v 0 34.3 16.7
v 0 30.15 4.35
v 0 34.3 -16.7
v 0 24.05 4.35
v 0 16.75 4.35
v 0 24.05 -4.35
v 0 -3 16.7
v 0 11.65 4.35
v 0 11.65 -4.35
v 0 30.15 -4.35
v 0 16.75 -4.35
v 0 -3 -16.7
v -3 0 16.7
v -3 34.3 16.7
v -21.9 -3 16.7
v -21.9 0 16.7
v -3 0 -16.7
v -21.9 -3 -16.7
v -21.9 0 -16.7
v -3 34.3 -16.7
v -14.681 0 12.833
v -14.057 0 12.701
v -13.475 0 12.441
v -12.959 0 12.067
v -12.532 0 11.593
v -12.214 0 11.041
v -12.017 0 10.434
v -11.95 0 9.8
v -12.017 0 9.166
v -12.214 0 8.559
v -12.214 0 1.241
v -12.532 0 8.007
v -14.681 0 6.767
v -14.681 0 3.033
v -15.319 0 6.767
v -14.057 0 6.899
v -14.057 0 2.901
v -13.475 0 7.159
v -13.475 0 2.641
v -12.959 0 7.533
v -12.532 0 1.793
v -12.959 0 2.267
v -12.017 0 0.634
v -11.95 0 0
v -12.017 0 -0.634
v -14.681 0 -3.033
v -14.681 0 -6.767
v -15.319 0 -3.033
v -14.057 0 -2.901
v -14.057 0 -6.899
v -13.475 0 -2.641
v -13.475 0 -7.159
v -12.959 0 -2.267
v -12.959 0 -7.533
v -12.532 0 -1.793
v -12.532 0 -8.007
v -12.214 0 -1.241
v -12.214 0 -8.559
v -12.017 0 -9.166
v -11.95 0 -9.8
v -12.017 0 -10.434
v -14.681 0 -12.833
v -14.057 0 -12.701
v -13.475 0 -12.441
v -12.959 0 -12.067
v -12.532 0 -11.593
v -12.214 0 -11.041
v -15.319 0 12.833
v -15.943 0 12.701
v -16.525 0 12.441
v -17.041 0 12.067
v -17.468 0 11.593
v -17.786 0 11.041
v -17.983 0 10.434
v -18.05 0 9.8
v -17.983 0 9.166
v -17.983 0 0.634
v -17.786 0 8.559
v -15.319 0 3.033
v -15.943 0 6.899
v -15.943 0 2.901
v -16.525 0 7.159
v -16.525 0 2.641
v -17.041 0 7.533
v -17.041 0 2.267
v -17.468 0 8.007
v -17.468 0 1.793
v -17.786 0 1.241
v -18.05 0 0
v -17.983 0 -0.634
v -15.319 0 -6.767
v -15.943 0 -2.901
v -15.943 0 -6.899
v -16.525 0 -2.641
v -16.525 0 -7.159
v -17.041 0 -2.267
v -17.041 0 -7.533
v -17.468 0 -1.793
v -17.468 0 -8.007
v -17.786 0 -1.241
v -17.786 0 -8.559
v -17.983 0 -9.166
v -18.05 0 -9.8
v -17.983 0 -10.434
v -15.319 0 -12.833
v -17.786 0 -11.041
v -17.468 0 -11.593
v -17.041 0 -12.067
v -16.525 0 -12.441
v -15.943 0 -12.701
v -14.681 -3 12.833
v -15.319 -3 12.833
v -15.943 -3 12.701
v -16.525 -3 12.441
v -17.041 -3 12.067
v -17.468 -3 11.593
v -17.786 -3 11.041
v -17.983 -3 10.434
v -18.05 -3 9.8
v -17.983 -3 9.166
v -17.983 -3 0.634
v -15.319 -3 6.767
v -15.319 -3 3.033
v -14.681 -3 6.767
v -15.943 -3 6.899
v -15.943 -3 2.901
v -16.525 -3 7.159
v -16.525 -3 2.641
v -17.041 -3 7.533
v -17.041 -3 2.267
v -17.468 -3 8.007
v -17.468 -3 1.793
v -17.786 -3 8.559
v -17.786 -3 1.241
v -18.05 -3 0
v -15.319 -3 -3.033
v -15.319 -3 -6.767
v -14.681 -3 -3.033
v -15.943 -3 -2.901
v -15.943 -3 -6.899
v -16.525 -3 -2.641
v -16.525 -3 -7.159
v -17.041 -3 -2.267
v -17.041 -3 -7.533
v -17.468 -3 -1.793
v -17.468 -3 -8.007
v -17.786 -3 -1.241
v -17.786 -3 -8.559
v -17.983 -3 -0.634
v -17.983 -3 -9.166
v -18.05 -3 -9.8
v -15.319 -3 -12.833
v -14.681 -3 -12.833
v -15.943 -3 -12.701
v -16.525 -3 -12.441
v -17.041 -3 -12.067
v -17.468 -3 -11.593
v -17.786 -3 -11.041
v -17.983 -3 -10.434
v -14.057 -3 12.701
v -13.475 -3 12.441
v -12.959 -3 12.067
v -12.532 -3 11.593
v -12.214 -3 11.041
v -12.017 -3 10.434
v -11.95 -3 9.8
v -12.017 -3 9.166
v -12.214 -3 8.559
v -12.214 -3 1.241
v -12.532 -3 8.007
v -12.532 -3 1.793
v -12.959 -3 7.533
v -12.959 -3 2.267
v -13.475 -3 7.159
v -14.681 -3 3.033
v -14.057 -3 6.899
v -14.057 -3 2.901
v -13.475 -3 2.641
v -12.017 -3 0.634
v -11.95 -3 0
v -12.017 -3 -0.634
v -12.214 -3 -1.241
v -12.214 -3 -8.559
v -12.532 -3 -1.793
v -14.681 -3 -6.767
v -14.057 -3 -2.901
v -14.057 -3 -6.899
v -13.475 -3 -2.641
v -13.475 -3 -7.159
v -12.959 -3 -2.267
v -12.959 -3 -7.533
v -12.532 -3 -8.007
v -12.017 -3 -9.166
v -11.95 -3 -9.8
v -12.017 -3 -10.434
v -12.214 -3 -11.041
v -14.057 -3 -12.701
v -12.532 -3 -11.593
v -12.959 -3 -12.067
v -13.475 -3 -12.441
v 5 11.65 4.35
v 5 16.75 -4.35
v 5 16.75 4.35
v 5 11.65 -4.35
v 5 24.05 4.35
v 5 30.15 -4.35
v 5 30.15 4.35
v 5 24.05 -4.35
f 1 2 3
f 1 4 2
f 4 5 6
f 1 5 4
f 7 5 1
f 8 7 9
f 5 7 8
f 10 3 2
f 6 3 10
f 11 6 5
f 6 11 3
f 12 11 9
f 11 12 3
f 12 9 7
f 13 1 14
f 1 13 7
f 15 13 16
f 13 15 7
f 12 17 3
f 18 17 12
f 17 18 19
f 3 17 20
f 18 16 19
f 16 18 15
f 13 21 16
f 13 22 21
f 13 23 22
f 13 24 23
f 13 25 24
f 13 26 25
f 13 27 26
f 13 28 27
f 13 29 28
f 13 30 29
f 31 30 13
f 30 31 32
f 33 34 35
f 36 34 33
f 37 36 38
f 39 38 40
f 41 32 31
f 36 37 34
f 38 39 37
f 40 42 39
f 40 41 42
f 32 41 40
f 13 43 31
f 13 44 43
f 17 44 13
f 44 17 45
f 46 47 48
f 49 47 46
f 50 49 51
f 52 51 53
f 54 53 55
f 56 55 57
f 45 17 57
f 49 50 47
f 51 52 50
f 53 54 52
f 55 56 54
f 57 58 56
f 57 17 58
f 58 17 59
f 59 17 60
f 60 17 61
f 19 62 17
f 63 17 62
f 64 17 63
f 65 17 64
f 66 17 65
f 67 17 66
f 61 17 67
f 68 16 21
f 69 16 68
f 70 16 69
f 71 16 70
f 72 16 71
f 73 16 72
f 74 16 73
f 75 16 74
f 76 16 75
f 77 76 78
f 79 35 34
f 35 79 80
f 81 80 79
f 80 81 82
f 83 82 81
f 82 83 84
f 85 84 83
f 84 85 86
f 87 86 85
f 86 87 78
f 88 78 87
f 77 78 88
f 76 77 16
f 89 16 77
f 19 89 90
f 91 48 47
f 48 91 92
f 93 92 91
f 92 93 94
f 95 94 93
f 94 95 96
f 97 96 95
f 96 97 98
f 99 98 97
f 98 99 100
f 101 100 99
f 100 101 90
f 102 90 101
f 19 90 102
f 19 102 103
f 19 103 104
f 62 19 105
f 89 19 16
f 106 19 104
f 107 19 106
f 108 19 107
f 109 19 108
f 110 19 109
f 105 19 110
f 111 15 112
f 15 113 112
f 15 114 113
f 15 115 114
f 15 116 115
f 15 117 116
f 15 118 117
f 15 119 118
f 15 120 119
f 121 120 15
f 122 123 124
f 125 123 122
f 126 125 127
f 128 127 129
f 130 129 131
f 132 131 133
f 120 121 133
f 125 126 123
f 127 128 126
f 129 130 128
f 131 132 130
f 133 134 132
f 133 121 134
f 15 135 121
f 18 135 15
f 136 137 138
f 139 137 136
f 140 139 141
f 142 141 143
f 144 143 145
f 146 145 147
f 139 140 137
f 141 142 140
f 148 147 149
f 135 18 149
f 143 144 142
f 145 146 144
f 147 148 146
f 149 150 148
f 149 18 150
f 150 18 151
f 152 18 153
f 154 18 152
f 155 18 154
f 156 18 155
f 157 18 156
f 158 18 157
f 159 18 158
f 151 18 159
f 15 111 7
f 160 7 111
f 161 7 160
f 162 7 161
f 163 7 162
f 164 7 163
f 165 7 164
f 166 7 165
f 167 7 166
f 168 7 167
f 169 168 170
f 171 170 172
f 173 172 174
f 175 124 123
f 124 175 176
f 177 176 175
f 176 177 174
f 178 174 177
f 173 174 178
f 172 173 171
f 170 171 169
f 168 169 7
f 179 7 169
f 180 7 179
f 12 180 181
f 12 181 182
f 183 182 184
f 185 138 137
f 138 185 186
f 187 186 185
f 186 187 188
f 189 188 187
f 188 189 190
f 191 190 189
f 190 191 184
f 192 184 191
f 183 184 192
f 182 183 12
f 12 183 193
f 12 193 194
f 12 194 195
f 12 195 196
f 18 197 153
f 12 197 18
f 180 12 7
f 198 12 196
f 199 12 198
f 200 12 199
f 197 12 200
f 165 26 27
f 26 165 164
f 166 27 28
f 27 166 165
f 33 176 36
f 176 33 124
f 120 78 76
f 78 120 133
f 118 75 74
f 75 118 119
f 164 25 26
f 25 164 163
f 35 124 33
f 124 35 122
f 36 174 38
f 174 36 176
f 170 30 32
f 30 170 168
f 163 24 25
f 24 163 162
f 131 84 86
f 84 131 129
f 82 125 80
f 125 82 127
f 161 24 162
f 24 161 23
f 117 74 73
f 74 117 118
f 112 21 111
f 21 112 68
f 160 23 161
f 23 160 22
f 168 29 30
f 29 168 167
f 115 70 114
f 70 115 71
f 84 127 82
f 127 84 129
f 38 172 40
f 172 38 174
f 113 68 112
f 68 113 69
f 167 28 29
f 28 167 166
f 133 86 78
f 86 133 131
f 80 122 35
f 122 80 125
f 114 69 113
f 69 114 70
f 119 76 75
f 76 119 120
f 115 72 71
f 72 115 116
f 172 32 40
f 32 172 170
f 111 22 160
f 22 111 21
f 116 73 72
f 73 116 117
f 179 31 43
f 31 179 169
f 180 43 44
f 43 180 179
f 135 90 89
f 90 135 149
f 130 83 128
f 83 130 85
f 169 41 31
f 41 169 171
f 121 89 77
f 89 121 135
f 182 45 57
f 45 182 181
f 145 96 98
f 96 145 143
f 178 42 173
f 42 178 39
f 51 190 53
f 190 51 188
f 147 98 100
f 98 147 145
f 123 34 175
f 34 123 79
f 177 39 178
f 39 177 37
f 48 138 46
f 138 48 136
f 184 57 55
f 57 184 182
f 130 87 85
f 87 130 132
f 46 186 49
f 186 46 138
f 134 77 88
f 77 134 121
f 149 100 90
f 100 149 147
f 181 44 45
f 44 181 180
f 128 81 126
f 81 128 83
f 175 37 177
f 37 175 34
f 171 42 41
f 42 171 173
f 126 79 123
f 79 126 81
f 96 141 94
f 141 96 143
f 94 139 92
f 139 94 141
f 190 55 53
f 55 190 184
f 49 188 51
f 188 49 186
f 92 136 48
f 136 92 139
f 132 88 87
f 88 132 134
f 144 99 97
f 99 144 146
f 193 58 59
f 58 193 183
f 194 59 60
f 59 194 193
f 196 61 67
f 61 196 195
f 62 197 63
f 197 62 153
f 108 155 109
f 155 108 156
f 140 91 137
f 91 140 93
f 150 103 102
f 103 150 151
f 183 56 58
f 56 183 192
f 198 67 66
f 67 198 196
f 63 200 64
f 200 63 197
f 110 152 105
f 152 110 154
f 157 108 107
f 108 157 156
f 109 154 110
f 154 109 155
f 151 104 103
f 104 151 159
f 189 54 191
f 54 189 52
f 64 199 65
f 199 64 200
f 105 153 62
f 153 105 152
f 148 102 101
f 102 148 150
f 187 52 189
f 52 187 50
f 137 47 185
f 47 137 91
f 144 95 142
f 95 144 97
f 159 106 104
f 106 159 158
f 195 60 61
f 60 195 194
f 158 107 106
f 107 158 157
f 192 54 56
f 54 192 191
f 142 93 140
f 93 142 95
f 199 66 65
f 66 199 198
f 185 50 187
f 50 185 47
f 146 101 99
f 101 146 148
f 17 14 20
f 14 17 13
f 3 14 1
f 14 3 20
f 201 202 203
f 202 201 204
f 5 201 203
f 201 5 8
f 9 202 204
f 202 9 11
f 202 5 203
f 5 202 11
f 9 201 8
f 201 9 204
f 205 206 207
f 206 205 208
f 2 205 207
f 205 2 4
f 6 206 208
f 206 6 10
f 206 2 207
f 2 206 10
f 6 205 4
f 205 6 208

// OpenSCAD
/**
 * Copyright 2018 Nathan Fairhurst.
 */

module mount(
  thickness, // How thick the walls should be
  clearance, // How much room should be around the screw holes/slots
  tolerance, // Room for error
  slot_depth, // How deep the slots should protrude
  slot_height, // Height of the slots (distance oriented from bottom to top of the car)
  front_slot_width, // Width of the slot closest to the driver (distance oriented from front to back of the car)
  back_slot_width, // Width of the slot furthest to the driver (distance oriented from front to back of the car)
  d_slot_to_slot, // space between the two slots measured from their closest edges
  d_slot_front_to_inner_bend, // the front most point of the forward slot, to the inside wall of the front wing
  screw_offset_width, // Distance from the furthest stereo-side point of the front wing to the center point of the screws
  screw_offset_height, // Distance from the pin center to the screw center
  screw_radius, // radius of the screw hole
  pin_radius, // radius of the pin hole
) {
  height =
    2 * (screw_radius + screw_offset_height + clearance);

  back_slot_offset =
    d_slot_front_to_inner_bend + front_slot_width + d_slot_to_slot;

  back_wing_length =
    back_slot_offset + back_slot_width + clearance;

  front_wing_length =
    screw_offset_width + max(screw_radius, pin_radius) + clearance;

  // Back wing
  translate([-thickness, 0, -height/2])
    cube([thickness, back_wing_length, height]);

  // Front slot
  translate([0, d_slot_front_to_inner_bend + tolerance/2, -(slot_height - tolerance)/2])
    cube([slot_depth, front_slot_width - tolerance, slot_height - tolerance]);

  // Back slot
  translate([0, back_slot_offset + tolerance/2, -(slot_height - tolerance)/2])
    cube([slot_depth, back_slot_width - tolerance, slot_height - tolerance]);

  // Front wing (with holes)
  difference() {
    translate([-front_wing_length, -thickness, -height/2])
      cube([front_wing_length, thickness, height]);

    // Top screw hole
    translate([-screw_offset_width, thickness/2, screw_offset_height])
      rotate([90, 0, 0])
      cylinder(thickness*2, screw_radius + tolerance/2, screw_radius + tolerance/2);

    // center pin hole
    translate([-screw_offset_width, thickness/2, 0])
      rotate([90, 0, 0])
      cylinder(thickness*2, pin_radius + tolerance/2, pin_radius + tolerance/2);

    // Bottom screw hole
    translate([-screw_offset_width, thickness/2, -screw_offset_height])
      rotate([90, 0, 0])
      cylinder(thickness*2, screw_radius + tolerance/2, screw_radius + tolerance/2);
  }
}

mount(
  3, // thickness
  4, // clearance
  0.3, // tolerance
  5, // slot_depth
  9, // slot_height
  5.4, // front_slot_width
  6.4, // back_slot_width
  7, // d_slot_to_slot
  11.5, // d_slot_front_to_inner_bend
  15, // screw_offset_width
  9.8, // screw_offset_height
  2.9, // screw_radius
  2.9, // pin_radius
  $fn=30
);
